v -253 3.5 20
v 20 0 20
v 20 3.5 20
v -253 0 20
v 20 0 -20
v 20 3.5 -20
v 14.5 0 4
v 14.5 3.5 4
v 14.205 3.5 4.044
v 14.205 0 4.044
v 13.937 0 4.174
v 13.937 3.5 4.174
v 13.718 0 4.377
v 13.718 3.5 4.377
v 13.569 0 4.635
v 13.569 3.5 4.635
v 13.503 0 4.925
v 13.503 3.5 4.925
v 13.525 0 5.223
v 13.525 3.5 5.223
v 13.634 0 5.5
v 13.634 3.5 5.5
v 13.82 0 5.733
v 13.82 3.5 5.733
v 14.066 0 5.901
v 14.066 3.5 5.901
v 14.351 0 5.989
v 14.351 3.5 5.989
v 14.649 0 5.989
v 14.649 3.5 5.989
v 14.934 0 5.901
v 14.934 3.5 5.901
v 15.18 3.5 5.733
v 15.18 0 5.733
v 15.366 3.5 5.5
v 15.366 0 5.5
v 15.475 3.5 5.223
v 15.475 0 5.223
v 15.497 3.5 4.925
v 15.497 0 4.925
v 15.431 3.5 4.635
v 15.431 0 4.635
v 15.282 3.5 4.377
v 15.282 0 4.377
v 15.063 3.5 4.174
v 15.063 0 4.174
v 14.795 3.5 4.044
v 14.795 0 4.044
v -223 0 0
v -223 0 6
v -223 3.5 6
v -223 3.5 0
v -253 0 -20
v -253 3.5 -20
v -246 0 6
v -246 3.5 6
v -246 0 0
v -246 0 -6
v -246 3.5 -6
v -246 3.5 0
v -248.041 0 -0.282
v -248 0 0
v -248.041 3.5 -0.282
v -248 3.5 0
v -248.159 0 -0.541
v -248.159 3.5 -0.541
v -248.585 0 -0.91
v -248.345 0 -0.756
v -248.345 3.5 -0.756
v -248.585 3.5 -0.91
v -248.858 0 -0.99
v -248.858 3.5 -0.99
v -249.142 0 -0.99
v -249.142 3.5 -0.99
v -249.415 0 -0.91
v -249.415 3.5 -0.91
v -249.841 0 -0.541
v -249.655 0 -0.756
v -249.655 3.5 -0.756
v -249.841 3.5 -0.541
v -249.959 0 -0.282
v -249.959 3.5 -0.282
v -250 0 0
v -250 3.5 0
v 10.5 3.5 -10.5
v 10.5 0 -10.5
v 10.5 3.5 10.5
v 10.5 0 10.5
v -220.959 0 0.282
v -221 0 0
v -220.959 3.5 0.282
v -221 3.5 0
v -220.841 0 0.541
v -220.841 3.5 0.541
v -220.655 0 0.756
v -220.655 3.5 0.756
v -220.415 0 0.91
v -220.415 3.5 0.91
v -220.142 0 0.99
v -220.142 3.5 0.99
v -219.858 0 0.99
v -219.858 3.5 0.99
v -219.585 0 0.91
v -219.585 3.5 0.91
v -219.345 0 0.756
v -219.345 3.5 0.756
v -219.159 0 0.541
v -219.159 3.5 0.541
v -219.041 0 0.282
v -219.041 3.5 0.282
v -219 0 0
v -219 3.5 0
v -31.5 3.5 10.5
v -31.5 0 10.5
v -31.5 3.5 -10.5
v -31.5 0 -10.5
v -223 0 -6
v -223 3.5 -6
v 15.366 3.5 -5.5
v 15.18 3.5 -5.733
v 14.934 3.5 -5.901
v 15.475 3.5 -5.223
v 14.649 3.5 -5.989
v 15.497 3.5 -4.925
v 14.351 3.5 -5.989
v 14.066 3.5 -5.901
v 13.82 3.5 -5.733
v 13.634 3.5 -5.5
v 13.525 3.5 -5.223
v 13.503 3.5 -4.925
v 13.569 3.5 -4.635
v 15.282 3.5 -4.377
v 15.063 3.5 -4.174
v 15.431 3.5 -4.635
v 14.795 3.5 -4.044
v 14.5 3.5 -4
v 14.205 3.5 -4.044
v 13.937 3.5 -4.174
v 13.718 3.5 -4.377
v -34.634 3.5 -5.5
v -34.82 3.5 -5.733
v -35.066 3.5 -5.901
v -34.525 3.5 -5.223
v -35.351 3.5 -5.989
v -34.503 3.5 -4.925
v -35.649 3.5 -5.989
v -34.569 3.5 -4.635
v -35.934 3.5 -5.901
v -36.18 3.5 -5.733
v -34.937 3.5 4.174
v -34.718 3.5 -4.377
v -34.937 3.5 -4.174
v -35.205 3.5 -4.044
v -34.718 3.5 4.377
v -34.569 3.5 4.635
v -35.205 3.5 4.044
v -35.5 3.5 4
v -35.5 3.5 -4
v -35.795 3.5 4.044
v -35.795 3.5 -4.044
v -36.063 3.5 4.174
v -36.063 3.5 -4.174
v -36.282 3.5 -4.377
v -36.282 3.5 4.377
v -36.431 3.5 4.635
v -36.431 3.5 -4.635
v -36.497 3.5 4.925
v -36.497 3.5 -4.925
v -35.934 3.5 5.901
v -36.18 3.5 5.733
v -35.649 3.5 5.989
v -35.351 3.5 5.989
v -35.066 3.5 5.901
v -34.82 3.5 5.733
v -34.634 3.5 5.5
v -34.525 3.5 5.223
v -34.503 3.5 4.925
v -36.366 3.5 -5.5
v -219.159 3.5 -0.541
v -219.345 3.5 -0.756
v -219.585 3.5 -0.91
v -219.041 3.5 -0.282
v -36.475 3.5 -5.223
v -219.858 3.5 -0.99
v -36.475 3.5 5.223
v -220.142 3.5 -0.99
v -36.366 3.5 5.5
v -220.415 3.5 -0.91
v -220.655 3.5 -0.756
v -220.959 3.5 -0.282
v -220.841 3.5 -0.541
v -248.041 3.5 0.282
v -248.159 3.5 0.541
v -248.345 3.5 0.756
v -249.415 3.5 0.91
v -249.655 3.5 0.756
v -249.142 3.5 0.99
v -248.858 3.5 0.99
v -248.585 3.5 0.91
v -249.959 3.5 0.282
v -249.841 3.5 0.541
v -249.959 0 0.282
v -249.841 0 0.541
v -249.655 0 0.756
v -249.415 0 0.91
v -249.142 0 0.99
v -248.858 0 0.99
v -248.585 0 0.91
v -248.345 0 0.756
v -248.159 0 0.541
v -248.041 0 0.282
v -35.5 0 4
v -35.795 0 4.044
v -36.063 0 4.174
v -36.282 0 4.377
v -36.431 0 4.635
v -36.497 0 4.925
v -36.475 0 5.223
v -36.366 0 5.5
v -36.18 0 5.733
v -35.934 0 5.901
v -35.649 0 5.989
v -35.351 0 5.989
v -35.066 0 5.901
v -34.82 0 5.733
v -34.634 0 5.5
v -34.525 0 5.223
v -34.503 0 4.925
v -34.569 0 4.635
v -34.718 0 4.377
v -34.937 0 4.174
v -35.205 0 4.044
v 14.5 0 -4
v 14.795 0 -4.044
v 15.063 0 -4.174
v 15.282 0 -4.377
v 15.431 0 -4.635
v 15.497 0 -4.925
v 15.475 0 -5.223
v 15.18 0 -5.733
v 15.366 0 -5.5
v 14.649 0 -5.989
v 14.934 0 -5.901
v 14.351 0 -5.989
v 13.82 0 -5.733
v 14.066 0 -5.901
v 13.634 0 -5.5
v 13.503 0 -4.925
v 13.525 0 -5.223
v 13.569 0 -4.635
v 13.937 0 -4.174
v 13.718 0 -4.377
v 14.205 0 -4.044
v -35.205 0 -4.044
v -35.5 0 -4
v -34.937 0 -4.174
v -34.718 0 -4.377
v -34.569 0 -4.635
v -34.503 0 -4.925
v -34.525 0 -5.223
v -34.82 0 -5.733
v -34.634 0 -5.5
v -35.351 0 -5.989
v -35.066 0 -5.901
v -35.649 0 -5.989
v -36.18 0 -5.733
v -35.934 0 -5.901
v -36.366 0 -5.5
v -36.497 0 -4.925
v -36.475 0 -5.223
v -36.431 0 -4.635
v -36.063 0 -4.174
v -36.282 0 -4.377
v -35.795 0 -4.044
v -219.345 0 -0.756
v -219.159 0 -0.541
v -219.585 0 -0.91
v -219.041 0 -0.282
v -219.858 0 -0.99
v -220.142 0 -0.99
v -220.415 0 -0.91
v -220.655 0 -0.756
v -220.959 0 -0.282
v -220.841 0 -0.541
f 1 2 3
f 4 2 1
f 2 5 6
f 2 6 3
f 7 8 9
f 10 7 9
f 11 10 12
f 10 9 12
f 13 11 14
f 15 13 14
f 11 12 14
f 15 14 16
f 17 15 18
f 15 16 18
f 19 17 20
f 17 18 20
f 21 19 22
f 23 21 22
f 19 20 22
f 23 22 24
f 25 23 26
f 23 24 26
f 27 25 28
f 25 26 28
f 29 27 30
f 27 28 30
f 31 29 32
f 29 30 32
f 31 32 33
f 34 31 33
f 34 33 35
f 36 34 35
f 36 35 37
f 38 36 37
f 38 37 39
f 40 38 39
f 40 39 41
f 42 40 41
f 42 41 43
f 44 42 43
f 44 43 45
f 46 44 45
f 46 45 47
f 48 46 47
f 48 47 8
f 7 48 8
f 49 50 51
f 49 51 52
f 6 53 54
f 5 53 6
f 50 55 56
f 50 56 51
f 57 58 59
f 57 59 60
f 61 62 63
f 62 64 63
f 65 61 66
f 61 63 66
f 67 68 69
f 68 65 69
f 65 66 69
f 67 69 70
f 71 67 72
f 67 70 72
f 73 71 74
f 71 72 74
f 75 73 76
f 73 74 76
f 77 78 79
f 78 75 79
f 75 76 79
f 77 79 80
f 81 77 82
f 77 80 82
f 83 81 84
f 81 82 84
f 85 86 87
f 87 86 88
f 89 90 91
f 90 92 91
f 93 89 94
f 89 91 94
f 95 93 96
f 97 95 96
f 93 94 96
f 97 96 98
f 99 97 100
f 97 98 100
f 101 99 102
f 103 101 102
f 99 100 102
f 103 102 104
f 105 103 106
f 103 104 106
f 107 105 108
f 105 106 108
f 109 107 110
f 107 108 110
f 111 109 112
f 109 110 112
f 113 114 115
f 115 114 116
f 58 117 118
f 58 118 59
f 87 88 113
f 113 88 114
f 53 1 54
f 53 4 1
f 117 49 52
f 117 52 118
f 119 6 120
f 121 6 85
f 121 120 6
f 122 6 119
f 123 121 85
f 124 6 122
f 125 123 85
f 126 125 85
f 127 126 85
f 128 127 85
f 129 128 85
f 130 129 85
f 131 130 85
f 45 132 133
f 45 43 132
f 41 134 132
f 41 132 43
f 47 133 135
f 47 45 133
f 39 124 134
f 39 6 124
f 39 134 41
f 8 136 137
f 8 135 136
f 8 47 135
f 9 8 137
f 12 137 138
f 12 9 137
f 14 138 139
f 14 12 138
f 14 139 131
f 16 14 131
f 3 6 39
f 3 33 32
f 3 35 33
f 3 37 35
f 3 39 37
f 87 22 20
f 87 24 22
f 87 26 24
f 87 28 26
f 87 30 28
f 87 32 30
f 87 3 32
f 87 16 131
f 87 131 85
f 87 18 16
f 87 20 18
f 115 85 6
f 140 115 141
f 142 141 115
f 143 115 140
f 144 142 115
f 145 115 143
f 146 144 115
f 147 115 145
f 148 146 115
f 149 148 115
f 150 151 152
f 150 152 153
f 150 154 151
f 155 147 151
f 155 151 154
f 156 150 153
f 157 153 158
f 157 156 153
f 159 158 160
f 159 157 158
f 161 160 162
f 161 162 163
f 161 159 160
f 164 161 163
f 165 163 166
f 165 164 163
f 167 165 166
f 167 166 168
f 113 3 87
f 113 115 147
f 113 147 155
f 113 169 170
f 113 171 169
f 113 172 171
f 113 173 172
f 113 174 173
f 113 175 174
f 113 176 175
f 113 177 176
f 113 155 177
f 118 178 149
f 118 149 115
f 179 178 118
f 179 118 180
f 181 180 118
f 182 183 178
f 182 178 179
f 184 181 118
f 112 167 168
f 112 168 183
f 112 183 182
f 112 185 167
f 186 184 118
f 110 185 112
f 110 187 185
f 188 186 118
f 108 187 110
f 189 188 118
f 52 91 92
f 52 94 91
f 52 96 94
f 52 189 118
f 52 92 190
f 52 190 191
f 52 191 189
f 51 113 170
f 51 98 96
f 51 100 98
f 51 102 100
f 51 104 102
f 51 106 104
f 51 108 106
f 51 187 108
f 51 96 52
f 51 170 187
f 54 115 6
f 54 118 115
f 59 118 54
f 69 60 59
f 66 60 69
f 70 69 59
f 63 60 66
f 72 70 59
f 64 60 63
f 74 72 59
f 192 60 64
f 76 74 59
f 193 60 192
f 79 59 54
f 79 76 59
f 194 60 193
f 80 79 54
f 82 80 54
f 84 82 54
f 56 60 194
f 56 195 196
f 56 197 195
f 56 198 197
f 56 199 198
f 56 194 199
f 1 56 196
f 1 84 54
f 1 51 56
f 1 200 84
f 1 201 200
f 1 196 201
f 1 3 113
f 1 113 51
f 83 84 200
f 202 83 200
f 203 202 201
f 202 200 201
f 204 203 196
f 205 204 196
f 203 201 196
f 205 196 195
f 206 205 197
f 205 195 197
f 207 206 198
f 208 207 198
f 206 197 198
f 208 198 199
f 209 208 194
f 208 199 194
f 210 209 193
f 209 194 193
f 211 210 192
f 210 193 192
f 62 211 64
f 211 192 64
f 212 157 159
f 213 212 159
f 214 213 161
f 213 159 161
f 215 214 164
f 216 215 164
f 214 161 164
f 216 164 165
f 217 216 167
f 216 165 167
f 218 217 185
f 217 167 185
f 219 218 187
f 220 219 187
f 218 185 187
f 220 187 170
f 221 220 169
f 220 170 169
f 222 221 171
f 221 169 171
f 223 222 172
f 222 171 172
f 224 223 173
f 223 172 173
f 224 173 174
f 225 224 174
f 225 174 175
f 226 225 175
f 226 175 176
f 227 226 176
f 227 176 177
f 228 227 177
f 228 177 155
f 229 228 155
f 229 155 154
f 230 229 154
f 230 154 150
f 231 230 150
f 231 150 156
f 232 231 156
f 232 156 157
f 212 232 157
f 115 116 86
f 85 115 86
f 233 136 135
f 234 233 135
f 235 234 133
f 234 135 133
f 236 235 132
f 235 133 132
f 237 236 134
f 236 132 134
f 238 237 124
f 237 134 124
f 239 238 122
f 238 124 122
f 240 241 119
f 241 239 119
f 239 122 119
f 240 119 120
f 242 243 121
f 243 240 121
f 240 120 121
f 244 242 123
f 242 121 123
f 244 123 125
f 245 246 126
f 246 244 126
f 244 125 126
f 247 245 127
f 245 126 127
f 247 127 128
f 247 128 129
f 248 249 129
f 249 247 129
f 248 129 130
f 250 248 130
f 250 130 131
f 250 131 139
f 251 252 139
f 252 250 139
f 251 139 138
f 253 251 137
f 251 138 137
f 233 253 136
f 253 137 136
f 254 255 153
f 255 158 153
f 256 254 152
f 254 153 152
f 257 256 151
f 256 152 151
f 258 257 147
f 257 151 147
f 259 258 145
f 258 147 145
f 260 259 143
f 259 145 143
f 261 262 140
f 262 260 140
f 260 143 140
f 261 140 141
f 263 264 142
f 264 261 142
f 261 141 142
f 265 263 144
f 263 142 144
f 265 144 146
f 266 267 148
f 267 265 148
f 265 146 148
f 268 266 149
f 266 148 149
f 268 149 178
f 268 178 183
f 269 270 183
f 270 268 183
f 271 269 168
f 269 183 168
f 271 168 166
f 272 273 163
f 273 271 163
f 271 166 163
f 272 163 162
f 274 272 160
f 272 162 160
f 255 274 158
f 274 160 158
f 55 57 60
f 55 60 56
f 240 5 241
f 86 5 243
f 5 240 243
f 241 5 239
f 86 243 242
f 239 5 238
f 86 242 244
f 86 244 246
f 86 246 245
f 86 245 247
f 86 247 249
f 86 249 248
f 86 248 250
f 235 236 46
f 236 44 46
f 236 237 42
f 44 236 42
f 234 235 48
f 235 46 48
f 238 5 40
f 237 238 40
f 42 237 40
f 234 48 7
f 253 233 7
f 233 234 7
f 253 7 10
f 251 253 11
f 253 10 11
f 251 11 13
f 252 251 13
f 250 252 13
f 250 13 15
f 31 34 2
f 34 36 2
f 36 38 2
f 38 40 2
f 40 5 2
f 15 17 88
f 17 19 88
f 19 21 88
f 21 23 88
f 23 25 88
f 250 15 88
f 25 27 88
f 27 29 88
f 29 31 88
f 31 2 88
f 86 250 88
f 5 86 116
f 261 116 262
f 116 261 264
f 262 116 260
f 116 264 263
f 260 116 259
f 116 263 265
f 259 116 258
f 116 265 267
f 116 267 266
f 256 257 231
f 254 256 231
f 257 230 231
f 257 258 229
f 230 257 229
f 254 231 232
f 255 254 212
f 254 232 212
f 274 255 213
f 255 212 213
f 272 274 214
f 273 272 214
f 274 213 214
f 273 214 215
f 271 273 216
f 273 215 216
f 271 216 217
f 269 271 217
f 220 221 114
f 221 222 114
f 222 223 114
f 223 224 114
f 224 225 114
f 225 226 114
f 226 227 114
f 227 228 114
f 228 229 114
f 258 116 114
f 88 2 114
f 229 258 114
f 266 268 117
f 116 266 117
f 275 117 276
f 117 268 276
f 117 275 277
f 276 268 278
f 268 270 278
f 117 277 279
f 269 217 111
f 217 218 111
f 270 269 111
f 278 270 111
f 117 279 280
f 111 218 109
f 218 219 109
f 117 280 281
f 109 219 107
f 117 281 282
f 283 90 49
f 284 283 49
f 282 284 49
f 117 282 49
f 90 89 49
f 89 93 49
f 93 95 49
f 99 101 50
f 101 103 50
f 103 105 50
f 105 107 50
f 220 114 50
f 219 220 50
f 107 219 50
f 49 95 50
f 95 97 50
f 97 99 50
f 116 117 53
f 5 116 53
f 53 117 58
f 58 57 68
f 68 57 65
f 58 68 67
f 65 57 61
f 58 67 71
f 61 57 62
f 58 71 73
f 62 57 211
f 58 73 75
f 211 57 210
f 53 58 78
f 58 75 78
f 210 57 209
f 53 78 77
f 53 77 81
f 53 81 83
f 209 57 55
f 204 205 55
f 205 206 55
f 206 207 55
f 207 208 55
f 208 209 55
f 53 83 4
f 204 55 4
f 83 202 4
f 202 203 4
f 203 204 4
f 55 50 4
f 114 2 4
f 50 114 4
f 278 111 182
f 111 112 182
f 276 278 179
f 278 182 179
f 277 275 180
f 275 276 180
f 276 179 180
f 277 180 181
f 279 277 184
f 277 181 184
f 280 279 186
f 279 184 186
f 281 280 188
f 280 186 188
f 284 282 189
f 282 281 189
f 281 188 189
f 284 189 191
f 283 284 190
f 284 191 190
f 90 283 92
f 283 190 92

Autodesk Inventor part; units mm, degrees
ref_plane "YZ Plane" through (0, 0, 0) normal (1, 0, 0) x (0, 1, 0)
ref_plane "XZ Plane" through (0, 0, 0) normal (0, 1, 0) x (-1, 0, 0)
ref_plane "XY Plane" through (0, 0, 0) normal (0, 0, 1) x (1, 0, 0)
sketch "Sketch1" plane through (0, 0, 0) normal (0, 1, 0) x (-1, 0, 0)
  line L0 (0, 0) -> (31.5, 0)
  line L1 (223, -6) -> (246, -6)
  line L2 (246, -6) -> (246, 6)
  line L3 (246, 6) -> (223, 6)
  line L4 (223, 6) -> (223, -6)
  line L5 (223, -6) -> (246, 6) construction
  line L6 (246, -6) -> (223, 6) construction
  line L7 (234.5, 0) -> (249, 0) construction
  line L8 (234.5, 0) -> (220, 0) construction
  line L9 (0, 0) -> (18.5, 0) construction
  line L10 (223, 0) -> (240, 0) construction
  line L11 (0, 0) -> (-10.5, 0)
  line L12 (-20, 0) -> (-20, 20)
  line L13 (-20, 20) -> (253, 20)
  line L14 (253, 20) -> (253, 0)
  line L15 (253, 0) -> (240, 0) construction
  line L16 (253, 0) -> (246, 0)
  line L17 (-10.5, 10.5) -> (31.5, 10.5)
  line L18 (31.5, 10.5) -> (31.5, -10.5)
  line L19 (31.5, -10.5) -> (-10.5, -10.5)
  line L20 (-10.5, -10.5) -> (-10.5, 10.5)
  line L21 (-10.5, 10.5) -> (31.5, -10.5) construction
  line L22 (31.5, 10.5) -> (-10.5, -10.5) construction
  line L23 (-14.5, 5) -> (35.5, 5) construction
  line L24 (35.5, 5) -> (35.5, -5) construction
  line L25 (35.5, -5) -> (-14.5, -5) construction
  line L26 (-14.5, -5) -> (-14.5, 5) construction
  line L27 (-14.5, 5) -> (35.5, -5) construction
  line L28 (35.5, 5) -> (-14.5, -5) construction
  line L29 (31.5, 0) -> (223, 0)
  line L30 (-10.5, 0) -> (-20, 0)
  line L31 (-20, 0) -> (0, 0) construction
  point P0 (10.5, 0)
  point P1 (10.5, 0)
  dimension "d21" = 240
  dimension "d22" = 23
  dimension "d23" = 12
  dimension "d24" = 6
  dimension "d25" = 14.5
  dimension "d26" = 14.5
  dimension "d28" = 18.5
  dimension "d37" = 20
  dimension "d38" = 20
  dimension "d39" = 42
  dimension "d40" = 21
  dimension "d41" = 50
  dimension "d42" = 10
  dimension "d43" = 10.5
  dimension "d52" = 7
extrude "Extrusion1" add sketch "Sketch1" along normal blind 3.5 contours L18 L17 L20 L30 L12 L13 L14 L16 L2 L3 L4 L29
hole "Hole3" at (0, 0, 0) at (-249, 0, 0) at (-220, 0, 0) at (14.5, 0, 5) at (-35.5, 0, 5) direction (0, 1, 0) diameter 2 end through all
fillet "Fillet1" [suppressed]
mirror "Mirror1" about plane through (-31.5, 0, 0) normal (0, 0, -1)
properties part number "segment2a" material "Plywood, Finish"
